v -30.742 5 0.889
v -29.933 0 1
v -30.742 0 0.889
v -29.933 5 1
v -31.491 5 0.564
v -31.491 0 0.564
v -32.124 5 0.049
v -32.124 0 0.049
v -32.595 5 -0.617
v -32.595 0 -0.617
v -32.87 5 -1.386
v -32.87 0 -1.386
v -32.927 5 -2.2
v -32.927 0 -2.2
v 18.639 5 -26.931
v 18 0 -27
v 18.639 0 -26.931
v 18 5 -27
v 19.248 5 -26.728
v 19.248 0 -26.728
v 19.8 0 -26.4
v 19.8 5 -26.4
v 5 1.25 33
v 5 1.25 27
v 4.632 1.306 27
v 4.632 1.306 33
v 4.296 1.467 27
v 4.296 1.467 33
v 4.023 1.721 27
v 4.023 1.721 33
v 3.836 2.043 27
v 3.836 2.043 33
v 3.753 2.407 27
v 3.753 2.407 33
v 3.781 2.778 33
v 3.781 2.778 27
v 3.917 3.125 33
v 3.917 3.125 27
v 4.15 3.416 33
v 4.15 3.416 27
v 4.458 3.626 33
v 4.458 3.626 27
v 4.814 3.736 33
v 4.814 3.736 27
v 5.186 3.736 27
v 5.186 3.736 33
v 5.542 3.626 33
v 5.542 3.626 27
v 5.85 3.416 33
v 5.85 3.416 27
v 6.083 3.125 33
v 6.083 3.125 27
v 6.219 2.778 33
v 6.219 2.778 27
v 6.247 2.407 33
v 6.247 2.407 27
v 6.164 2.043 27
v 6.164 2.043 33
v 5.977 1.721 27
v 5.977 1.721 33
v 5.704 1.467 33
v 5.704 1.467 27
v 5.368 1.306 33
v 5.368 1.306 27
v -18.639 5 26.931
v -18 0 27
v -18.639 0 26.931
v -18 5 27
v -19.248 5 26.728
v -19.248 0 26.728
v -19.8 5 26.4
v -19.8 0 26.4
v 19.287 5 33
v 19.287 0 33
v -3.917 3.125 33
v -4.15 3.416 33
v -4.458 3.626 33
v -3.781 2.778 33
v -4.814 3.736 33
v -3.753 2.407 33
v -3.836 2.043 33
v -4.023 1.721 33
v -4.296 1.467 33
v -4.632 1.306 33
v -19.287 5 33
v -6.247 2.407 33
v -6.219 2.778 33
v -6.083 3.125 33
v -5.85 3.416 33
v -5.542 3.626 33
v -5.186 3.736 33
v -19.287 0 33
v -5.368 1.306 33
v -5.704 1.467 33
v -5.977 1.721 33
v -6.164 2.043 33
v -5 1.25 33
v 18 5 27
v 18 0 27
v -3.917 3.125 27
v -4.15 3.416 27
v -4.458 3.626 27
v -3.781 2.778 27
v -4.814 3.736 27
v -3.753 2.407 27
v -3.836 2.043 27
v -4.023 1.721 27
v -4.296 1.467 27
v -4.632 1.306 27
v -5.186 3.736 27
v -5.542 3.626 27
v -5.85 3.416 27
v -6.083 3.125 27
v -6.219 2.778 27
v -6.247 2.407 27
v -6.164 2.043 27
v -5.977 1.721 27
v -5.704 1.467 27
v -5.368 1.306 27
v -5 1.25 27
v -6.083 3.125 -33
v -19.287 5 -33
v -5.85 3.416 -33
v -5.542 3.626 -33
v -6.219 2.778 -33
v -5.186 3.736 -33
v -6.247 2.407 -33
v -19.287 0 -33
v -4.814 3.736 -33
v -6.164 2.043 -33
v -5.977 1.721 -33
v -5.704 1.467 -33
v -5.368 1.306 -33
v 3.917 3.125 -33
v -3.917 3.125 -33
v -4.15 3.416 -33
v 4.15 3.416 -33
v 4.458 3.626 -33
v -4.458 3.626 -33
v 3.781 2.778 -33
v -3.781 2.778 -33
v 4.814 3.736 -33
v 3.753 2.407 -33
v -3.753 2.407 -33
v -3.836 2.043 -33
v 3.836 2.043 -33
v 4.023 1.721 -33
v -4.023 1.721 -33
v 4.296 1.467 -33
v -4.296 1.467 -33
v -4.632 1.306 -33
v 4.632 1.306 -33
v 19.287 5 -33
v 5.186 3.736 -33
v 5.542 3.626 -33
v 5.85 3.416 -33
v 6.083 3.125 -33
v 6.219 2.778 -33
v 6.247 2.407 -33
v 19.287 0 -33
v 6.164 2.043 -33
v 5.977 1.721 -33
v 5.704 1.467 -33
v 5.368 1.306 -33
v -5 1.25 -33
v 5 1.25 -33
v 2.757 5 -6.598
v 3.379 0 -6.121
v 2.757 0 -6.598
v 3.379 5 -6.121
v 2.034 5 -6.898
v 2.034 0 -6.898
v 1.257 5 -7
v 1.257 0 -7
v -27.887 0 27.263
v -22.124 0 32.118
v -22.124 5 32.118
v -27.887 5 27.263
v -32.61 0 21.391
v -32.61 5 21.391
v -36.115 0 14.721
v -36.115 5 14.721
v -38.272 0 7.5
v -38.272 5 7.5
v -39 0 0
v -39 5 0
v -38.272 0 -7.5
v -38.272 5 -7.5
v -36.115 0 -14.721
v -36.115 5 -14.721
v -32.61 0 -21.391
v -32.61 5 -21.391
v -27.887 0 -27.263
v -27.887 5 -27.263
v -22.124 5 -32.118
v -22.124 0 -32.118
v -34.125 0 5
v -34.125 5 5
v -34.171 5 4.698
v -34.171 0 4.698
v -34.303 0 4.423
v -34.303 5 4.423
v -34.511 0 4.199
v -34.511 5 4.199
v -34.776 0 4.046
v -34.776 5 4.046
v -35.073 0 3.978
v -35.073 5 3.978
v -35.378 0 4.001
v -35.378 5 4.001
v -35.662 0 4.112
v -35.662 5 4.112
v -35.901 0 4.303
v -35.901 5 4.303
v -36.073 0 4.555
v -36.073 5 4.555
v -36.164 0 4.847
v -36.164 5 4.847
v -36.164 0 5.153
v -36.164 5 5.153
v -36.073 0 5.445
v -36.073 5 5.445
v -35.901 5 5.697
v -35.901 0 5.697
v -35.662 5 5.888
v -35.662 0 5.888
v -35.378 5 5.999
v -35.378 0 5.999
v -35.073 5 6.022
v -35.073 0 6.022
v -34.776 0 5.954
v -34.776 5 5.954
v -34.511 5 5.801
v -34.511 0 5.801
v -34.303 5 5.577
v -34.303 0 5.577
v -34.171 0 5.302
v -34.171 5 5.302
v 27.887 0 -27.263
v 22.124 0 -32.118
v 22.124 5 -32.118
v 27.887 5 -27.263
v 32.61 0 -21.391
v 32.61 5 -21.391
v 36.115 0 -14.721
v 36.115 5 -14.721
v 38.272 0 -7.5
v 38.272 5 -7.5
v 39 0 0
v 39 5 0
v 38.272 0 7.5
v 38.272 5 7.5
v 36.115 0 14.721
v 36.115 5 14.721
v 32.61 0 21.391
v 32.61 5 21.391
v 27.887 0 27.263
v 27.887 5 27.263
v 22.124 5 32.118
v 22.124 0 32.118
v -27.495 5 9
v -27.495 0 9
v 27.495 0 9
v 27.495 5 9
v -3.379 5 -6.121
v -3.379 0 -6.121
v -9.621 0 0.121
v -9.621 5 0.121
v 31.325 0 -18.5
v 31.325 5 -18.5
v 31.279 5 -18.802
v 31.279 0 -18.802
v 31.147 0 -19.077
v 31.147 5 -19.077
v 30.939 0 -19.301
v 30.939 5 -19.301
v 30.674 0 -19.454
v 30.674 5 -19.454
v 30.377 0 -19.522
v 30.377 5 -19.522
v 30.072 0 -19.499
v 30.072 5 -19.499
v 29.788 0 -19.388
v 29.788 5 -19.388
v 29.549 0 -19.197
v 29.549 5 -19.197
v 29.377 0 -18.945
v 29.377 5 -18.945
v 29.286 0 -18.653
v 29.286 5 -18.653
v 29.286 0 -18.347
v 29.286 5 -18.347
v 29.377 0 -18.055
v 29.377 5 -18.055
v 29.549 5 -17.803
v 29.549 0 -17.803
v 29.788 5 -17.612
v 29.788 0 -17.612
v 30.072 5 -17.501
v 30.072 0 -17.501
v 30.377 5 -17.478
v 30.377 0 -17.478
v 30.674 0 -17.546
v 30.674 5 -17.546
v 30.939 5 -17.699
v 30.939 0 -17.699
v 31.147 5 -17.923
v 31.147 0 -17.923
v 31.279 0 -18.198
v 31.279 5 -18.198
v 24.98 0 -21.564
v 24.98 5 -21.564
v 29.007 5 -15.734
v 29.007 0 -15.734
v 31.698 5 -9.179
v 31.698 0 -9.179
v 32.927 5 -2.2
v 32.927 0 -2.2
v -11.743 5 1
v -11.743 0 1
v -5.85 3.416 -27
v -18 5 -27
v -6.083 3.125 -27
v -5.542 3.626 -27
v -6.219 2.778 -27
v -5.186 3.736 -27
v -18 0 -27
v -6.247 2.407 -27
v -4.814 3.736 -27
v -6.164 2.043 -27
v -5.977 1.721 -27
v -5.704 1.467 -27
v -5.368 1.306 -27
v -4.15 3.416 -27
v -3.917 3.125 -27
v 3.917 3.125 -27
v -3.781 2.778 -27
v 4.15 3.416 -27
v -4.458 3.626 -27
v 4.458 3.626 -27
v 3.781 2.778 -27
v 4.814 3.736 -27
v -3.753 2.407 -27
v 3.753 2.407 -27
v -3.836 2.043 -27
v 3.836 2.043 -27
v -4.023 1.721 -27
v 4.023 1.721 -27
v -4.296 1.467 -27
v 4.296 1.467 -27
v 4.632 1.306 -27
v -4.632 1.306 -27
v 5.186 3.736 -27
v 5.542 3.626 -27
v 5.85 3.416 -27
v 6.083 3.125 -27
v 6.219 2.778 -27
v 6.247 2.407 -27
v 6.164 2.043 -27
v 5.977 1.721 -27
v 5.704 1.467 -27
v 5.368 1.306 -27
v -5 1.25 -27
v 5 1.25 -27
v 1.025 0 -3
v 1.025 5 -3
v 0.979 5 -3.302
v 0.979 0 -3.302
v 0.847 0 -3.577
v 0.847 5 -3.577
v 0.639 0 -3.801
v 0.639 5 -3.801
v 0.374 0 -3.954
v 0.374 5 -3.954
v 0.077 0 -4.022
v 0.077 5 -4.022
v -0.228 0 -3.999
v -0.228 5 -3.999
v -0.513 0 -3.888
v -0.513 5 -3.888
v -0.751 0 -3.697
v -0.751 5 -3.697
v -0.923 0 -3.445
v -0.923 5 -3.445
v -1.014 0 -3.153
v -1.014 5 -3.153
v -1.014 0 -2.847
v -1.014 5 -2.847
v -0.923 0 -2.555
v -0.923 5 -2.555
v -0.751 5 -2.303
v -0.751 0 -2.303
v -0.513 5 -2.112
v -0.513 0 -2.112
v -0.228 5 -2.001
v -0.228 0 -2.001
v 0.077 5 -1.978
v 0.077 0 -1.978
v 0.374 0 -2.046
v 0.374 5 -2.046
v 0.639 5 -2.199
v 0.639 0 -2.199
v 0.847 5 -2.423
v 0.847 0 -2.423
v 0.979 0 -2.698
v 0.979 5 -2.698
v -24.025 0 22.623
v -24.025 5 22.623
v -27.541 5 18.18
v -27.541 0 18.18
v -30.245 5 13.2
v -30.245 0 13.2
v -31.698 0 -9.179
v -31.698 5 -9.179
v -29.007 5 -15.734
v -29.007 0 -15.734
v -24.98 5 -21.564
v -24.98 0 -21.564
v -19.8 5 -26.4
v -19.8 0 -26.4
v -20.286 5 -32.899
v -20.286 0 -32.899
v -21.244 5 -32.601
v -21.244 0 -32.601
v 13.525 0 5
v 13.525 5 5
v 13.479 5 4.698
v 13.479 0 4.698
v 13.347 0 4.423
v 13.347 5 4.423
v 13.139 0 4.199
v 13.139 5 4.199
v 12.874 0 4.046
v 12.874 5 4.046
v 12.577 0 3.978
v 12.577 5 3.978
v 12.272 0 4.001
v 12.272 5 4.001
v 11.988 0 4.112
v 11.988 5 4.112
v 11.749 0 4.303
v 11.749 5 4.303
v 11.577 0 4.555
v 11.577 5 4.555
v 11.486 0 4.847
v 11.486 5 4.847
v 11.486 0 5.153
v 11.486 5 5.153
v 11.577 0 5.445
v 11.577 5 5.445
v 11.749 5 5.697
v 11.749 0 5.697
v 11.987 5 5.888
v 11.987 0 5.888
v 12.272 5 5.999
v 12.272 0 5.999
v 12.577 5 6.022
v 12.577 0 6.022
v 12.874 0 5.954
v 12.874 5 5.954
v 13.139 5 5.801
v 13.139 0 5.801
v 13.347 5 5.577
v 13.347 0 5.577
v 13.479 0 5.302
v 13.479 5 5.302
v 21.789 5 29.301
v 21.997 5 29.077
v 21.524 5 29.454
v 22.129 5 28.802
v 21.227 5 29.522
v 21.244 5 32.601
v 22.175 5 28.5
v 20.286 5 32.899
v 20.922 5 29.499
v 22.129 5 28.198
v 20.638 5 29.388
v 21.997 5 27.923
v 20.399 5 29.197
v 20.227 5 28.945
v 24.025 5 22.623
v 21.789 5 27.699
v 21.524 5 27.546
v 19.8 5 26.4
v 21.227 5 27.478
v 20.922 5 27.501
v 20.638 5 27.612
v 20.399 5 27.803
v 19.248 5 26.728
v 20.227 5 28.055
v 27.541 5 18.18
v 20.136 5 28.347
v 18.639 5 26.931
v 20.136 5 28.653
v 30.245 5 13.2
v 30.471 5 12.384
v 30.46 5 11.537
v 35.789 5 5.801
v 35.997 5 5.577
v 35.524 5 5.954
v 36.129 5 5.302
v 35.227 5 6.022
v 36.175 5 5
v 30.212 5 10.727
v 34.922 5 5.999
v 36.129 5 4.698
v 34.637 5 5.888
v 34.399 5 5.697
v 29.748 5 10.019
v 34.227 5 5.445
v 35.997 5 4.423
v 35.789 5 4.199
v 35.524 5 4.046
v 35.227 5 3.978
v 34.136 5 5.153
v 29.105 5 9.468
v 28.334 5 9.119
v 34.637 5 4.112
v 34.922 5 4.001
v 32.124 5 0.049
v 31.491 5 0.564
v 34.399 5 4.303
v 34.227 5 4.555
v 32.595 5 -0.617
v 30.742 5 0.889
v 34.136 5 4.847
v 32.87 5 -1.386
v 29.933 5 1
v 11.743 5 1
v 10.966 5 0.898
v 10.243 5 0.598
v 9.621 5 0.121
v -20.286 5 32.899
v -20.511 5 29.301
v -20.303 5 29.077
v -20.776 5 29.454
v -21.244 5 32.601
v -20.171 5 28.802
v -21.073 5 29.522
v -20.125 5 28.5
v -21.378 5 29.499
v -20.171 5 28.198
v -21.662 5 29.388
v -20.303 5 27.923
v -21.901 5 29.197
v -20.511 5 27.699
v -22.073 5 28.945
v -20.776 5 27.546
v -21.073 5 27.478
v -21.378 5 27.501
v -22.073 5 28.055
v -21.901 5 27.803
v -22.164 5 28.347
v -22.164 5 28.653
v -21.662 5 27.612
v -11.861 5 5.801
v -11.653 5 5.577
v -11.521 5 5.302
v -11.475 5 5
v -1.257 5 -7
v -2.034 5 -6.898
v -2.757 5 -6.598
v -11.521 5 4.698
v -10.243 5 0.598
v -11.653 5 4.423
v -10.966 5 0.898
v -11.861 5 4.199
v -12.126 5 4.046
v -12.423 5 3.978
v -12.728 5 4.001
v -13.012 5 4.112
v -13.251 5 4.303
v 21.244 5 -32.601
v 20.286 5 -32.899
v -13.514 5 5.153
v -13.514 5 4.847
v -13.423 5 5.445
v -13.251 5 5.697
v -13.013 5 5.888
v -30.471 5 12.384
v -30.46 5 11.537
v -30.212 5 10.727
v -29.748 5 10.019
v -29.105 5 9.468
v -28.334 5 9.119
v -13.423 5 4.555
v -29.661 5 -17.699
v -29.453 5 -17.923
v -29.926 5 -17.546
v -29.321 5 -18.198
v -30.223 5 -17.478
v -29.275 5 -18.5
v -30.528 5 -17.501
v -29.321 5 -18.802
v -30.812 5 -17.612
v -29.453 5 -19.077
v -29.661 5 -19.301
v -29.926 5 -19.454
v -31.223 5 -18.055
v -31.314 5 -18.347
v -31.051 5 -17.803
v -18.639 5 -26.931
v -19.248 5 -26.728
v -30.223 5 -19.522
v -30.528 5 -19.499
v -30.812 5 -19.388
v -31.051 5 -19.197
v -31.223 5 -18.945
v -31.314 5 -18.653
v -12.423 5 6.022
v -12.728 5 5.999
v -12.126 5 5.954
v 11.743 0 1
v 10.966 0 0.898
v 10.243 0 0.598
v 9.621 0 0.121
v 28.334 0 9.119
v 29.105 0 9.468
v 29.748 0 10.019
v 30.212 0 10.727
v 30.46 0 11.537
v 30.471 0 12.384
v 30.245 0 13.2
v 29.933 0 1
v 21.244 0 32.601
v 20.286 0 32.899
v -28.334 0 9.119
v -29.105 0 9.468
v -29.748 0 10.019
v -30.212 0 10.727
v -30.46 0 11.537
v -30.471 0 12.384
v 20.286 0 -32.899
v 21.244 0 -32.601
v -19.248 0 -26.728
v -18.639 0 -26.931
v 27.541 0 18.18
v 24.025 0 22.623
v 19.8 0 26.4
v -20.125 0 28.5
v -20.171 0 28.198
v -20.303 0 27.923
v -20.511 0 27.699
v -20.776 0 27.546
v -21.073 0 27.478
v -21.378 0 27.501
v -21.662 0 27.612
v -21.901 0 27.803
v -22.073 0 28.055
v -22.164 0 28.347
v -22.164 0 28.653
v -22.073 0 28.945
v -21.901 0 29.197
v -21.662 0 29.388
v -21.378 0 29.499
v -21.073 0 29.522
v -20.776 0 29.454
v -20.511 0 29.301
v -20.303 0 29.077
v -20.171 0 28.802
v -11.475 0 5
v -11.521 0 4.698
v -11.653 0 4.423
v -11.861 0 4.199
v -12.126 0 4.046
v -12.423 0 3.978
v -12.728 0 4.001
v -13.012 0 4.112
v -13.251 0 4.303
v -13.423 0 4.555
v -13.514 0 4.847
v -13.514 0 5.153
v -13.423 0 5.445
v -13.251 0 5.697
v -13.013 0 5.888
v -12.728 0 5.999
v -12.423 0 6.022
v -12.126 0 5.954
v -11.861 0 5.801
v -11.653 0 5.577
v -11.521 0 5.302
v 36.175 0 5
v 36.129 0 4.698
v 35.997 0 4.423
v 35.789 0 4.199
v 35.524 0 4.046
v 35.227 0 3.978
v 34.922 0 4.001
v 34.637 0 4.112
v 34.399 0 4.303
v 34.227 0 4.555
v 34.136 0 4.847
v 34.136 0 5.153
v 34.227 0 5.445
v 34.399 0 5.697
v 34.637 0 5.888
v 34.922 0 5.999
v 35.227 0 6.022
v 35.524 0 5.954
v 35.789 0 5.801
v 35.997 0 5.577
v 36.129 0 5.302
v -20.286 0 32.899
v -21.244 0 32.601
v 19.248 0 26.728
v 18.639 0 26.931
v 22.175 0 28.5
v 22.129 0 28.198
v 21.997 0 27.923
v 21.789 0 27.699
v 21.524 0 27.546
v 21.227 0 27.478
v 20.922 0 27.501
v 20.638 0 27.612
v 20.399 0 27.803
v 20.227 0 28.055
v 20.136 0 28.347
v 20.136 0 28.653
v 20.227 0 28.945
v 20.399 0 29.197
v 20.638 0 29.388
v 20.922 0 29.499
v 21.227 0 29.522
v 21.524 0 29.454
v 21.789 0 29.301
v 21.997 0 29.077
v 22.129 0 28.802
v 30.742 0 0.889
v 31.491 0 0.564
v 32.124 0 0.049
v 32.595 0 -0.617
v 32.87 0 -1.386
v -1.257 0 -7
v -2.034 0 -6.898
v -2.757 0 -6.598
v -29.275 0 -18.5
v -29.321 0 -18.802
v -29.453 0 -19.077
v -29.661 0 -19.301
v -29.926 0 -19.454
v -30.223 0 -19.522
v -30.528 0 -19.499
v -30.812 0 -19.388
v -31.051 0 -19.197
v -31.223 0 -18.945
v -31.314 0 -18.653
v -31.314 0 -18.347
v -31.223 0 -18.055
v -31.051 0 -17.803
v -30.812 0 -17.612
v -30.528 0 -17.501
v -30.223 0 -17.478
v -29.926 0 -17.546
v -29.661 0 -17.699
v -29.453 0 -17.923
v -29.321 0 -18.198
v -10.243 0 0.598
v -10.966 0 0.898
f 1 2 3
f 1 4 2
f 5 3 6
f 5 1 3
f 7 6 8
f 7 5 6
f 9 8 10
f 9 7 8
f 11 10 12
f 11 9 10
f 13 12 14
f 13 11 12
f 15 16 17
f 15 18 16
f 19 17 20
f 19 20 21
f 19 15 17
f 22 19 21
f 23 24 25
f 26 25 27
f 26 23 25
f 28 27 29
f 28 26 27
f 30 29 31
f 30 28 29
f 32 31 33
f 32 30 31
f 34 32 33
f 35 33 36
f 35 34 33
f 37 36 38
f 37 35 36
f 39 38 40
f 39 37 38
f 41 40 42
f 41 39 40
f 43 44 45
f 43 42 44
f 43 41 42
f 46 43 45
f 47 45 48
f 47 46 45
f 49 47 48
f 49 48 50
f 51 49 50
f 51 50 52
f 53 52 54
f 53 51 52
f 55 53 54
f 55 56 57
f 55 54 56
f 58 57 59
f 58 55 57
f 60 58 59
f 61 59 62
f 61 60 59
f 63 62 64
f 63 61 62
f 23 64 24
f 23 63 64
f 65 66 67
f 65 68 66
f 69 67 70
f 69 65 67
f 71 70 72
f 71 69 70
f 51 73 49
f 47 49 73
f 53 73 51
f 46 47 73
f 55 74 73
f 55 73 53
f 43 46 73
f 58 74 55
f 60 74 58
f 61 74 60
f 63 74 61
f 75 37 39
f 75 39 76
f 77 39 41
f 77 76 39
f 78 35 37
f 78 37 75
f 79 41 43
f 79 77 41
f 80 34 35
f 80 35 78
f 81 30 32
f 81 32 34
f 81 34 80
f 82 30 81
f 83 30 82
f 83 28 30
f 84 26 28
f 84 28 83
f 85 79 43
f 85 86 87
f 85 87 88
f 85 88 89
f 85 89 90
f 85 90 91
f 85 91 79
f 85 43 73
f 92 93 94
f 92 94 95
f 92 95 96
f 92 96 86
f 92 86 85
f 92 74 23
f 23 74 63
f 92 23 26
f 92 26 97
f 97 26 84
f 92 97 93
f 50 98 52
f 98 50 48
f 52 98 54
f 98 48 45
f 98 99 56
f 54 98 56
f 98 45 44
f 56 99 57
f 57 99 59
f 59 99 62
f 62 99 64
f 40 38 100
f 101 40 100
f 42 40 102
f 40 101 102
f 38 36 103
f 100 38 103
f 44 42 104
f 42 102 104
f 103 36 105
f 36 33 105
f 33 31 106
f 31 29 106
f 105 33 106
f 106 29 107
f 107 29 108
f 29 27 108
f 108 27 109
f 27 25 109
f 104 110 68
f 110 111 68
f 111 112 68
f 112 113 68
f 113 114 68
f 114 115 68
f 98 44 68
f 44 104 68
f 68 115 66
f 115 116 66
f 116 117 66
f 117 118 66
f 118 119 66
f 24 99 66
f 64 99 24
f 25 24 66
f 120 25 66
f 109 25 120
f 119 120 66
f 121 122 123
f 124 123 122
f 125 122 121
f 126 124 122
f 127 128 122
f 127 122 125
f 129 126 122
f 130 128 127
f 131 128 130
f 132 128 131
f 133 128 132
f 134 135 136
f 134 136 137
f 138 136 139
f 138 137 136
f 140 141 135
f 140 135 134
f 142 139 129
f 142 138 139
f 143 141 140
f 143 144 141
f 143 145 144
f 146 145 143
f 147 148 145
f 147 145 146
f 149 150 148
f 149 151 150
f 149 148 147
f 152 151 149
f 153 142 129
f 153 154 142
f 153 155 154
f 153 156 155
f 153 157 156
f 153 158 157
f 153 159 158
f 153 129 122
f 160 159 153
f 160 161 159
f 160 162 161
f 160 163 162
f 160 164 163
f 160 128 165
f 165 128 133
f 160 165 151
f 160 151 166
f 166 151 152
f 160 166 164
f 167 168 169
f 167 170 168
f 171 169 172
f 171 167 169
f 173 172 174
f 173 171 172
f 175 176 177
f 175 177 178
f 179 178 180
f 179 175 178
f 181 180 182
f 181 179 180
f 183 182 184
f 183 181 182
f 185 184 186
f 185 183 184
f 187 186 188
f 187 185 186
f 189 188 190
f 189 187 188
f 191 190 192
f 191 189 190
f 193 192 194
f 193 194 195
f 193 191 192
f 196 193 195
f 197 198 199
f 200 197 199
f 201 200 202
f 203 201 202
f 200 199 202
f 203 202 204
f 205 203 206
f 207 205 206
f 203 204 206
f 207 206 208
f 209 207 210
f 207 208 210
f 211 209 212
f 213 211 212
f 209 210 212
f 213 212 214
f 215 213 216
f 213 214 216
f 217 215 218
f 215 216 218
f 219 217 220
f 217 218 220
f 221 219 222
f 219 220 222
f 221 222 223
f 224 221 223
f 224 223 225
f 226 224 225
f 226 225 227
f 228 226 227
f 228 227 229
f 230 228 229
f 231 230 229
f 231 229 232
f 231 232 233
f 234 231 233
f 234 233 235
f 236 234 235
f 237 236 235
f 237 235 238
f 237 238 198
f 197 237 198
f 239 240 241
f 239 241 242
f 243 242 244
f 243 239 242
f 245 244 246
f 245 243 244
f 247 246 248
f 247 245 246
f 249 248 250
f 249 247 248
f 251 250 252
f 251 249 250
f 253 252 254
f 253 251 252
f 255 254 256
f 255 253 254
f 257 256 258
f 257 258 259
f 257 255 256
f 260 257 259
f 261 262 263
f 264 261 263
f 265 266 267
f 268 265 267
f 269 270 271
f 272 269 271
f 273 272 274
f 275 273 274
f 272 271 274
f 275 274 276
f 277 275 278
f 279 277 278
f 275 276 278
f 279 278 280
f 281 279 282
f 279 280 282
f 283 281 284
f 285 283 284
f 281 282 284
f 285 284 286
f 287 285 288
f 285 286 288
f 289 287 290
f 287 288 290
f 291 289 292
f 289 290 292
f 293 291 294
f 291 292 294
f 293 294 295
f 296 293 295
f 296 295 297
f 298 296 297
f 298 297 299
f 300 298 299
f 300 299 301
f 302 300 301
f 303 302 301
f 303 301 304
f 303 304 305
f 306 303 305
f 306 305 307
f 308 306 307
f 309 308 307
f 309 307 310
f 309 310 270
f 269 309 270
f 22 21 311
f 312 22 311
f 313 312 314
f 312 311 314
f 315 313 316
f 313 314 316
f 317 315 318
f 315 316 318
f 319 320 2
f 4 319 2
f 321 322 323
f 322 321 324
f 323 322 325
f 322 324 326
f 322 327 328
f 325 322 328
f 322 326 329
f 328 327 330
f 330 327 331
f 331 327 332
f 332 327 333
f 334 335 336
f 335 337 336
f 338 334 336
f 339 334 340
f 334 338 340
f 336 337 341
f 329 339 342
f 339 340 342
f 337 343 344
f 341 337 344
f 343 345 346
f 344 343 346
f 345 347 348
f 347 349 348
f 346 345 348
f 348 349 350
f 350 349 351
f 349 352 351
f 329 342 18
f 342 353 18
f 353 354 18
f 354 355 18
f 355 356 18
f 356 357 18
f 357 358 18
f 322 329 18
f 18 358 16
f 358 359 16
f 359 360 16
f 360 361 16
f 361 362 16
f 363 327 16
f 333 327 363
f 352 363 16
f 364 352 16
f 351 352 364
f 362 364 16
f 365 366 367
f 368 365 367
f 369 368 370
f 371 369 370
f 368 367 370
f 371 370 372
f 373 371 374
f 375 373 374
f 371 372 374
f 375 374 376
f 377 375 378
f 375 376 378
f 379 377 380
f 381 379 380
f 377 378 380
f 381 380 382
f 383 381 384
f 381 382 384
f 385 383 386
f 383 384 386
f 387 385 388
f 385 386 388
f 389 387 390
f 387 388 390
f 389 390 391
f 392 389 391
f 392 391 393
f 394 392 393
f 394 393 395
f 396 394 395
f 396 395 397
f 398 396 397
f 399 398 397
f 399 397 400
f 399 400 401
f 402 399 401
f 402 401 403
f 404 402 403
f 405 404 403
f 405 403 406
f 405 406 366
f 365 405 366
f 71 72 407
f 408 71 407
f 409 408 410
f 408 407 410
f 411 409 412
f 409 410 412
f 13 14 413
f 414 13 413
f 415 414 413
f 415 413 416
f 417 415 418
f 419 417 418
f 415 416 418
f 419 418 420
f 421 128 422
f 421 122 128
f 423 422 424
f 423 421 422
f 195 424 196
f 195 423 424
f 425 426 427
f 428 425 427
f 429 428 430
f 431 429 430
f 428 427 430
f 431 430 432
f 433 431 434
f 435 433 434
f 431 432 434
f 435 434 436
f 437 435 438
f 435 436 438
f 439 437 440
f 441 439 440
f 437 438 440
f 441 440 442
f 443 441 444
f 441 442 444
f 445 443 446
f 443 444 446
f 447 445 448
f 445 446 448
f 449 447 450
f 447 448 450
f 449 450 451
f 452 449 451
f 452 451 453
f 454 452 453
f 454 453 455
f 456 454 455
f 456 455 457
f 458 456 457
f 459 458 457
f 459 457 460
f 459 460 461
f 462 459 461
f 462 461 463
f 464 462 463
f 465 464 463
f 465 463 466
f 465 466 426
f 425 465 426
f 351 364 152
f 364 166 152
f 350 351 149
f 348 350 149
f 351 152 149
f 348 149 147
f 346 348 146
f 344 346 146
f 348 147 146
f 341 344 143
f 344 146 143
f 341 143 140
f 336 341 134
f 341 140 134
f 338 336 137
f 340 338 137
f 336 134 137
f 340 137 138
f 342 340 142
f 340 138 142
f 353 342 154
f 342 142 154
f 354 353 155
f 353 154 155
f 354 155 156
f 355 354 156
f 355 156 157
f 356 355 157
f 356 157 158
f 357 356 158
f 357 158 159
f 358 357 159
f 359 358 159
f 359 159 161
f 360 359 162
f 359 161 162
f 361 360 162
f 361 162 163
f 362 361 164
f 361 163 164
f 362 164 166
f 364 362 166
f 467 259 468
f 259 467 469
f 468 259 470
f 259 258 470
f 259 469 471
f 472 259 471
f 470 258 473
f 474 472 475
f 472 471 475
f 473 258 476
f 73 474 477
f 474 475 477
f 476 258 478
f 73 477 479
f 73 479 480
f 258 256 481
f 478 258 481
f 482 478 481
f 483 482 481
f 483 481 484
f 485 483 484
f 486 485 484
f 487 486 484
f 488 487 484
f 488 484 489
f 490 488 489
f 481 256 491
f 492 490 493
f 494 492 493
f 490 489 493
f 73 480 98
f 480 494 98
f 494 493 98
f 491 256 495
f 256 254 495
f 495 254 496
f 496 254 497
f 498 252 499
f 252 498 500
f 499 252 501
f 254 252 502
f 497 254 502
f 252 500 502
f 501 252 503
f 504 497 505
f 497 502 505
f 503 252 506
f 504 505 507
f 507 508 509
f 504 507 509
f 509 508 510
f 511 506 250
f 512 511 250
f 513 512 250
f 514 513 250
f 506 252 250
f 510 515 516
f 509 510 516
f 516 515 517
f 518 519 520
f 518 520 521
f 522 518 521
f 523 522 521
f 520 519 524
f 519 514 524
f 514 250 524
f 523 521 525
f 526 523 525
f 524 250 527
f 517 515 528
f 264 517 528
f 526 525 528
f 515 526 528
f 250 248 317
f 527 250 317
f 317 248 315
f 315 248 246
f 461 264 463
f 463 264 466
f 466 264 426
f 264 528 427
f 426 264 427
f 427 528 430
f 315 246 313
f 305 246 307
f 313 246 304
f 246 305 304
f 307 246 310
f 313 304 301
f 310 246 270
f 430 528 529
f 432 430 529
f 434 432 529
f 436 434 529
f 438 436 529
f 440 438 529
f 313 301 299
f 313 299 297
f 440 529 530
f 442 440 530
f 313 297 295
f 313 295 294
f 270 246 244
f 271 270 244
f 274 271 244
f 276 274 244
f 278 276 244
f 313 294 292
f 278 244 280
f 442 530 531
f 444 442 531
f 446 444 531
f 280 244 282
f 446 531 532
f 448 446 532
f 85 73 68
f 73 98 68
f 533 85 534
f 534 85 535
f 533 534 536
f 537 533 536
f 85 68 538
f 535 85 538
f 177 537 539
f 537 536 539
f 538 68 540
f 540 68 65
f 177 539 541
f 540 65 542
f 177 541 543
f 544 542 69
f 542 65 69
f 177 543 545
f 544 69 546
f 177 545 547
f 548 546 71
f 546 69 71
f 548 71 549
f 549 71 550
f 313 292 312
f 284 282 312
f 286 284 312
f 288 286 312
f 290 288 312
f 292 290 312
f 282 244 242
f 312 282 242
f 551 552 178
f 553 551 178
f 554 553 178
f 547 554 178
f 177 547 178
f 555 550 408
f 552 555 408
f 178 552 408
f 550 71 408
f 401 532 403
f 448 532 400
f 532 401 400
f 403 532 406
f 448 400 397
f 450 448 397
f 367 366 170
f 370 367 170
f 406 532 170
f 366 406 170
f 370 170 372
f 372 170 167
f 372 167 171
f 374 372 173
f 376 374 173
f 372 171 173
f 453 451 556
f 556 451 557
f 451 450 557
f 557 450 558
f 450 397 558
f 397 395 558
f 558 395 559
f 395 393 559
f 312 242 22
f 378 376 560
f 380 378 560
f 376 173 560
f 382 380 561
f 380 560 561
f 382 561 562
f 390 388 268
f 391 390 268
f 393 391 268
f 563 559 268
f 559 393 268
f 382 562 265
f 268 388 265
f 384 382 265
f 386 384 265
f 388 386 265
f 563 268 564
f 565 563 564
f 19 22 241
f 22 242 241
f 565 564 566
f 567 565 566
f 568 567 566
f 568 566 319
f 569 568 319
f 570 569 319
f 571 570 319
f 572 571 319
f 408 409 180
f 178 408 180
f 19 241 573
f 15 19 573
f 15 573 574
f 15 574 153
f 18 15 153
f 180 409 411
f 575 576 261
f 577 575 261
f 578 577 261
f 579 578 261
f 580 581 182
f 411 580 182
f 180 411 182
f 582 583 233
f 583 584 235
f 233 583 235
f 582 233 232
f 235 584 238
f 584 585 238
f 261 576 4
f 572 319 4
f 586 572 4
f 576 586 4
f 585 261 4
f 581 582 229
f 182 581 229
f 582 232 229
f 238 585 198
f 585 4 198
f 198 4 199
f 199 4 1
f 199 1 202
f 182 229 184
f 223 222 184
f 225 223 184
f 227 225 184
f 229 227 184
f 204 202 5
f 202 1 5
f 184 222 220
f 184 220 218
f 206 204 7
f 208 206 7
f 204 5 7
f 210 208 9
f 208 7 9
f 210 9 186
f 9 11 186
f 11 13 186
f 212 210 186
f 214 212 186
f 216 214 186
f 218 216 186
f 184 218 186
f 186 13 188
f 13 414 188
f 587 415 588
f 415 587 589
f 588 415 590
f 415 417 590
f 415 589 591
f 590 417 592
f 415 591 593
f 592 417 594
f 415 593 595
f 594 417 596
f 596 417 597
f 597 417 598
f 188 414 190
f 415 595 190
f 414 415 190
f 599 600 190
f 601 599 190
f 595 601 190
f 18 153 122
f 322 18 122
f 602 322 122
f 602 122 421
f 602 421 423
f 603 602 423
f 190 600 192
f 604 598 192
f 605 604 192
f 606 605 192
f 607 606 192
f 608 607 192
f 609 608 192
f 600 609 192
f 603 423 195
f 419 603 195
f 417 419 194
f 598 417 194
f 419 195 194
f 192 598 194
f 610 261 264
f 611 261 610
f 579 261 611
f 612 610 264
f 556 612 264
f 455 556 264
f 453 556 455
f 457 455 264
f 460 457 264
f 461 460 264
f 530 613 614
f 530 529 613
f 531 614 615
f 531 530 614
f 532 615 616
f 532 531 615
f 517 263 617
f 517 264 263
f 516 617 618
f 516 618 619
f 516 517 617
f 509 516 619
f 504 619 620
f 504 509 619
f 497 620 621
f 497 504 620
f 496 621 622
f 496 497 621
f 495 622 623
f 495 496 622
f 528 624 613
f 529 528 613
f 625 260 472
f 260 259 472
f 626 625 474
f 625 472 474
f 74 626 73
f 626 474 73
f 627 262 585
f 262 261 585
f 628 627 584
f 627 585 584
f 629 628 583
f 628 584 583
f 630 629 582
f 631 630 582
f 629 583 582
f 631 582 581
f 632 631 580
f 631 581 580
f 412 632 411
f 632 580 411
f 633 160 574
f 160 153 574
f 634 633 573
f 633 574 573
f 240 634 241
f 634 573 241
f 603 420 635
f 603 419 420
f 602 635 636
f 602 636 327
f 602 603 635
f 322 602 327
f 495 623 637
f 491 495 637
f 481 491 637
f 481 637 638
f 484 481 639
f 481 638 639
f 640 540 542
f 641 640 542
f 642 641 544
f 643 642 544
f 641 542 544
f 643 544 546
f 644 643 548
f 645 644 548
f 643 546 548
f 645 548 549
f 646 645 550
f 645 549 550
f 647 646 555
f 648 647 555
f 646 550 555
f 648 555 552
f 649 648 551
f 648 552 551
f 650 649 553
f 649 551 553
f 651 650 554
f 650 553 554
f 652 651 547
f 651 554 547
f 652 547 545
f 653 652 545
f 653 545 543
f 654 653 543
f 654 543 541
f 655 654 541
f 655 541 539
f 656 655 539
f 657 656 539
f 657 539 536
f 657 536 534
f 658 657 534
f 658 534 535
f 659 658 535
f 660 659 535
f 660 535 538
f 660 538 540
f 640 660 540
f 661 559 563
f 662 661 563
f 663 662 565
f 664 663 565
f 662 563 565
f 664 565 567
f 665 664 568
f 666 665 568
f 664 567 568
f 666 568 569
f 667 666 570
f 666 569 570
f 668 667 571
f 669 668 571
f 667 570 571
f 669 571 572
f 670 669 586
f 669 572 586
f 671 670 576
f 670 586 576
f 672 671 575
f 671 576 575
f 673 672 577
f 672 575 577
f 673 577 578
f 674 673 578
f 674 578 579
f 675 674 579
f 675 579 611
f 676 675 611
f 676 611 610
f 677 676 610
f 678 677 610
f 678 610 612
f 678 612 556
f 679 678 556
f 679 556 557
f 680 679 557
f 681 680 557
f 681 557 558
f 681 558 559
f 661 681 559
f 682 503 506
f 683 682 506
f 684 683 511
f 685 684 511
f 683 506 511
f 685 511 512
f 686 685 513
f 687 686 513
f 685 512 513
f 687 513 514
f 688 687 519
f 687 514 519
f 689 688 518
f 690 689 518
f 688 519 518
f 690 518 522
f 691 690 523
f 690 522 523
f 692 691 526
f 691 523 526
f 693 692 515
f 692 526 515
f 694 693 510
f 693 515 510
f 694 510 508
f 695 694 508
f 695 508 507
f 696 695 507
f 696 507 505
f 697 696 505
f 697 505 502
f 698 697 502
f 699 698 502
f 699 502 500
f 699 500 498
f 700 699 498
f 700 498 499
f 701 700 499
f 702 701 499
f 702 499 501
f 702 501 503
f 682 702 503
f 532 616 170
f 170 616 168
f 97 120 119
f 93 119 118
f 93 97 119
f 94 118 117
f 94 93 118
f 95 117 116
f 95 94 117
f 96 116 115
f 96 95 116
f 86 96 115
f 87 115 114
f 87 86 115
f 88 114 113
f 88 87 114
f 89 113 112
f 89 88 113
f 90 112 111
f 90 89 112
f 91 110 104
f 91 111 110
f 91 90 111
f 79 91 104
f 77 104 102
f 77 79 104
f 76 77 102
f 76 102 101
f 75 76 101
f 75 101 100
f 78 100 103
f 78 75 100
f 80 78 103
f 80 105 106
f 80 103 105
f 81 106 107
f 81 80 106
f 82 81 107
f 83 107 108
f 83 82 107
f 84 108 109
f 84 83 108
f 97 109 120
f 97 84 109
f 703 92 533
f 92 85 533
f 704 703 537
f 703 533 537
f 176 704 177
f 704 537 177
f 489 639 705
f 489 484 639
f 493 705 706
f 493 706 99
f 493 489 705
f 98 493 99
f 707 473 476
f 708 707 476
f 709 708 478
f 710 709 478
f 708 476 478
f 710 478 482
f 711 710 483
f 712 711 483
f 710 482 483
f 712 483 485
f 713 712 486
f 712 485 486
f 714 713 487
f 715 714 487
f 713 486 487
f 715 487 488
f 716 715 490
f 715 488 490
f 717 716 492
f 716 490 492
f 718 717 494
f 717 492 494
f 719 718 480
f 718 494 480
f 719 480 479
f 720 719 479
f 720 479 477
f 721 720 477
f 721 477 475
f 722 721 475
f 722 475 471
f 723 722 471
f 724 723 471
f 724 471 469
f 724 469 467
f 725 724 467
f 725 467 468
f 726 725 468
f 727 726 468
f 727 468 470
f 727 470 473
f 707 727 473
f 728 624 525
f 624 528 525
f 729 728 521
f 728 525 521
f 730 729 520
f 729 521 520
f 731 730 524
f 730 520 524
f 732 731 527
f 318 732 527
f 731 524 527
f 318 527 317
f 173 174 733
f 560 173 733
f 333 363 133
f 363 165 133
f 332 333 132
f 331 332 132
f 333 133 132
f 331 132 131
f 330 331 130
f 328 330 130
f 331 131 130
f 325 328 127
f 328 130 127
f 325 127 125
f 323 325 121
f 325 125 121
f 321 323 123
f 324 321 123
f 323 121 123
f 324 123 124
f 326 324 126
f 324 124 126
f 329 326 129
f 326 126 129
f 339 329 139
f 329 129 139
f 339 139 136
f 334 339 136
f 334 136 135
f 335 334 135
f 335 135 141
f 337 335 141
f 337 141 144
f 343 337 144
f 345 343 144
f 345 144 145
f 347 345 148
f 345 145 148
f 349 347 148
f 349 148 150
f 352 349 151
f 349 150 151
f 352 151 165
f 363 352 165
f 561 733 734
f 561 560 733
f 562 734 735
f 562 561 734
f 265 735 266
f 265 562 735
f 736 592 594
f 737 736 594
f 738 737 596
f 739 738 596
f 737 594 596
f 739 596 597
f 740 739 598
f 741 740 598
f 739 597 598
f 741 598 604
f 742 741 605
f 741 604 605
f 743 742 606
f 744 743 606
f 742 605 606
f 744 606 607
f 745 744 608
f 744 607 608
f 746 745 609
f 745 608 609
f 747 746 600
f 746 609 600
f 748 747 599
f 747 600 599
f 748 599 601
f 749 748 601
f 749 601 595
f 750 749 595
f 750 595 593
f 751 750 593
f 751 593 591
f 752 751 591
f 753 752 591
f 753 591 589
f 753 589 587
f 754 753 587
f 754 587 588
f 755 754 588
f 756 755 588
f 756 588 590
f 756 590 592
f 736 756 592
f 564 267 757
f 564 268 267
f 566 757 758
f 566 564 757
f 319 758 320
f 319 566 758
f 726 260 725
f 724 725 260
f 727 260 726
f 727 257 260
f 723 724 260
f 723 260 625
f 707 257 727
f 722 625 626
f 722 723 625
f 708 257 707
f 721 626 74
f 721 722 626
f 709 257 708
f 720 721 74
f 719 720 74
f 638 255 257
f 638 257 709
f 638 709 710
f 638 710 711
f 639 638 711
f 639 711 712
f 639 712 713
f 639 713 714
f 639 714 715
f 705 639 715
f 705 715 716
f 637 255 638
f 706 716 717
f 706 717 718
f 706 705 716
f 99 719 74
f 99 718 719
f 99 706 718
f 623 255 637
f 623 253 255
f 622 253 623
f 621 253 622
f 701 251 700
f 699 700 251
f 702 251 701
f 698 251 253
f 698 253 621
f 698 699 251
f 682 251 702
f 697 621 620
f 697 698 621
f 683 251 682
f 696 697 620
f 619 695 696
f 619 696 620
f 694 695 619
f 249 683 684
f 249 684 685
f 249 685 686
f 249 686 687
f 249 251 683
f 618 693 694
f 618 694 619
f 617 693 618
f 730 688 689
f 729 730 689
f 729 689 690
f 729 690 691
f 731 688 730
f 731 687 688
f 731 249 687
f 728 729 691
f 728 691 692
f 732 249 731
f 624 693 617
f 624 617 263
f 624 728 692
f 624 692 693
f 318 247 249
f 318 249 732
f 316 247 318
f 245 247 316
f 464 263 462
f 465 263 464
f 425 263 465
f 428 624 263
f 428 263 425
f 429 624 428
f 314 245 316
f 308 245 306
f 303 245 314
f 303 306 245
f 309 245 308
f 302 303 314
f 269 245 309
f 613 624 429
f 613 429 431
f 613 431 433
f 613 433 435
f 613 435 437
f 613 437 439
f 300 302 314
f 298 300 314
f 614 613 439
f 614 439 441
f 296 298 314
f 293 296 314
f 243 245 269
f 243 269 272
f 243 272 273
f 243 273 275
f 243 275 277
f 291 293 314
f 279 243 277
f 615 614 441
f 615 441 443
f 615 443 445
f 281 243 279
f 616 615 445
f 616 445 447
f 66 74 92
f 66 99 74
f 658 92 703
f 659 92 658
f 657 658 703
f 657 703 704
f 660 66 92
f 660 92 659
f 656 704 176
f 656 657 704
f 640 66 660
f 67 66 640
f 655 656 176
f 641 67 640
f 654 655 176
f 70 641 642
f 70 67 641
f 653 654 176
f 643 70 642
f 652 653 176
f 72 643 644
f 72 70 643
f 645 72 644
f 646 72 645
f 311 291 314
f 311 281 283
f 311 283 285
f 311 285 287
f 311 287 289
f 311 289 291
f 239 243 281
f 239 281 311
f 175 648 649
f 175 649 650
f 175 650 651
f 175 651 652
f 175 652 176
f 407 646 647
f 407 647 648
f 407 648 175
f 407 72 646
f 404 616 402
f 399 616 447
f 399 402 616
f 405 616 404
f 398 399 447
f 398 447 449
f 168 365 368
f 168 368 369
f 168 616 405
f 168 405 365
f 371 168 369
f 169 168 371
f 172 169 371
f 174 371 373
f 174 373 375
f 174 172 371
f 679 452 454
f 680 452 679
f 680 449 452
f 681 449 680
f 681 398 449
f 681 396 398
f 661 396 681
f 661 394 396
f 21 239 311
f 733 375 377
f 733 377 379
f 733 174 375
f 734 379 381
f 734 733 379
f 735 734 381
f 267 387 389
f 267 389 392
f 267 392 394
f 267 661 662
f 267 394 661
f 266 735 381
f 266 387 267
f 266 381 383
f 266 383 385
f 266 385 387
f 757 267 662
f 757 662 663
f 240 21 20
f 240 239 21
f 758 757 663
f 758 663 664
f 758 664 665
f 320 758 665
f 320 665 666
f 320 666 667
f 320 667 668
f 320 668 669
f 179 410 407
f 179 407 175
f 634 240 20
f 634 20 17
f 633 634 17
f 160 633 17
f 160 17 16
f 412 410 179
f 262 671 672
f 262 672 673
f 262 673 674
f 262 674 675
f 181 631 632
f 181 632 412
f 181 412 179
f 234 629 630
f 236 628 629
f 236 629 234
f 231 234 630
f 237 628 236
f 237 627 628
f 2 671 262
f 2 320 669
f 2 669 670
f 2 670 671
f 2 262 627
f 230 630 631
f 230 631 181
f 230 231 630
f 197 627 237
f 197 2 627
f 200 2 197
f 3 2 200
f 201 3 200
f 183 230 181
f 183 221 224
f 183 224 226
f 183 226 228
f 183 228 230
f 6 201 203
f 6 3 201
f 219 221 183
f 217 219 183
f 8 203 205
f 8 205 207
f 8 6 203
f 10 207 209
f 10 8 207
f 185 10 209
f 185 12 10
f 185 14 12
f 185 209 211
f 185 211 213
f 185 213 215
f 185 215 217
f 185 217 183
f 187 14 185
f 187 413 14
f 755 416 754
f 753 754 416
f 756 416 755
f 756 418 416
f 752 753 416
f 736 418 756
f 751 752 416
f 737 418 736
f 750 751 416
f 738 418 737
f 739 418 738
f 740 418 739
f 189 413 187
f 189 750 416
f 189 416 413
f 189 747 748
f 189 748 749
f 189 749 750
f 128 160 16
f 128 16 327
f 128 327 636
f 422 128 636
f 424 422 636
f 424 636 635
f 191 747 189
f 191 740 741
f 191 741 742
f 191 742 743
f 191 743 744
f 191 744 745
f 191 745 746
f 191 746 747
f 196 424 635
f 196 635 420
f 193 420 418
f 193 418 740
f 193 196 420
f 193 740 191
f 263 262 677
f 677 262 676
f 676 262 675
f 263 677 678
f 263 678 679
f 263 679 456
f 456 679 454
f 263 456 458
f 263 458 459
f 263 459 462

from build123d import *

# Parameters (mm, degrees)
BOSS_EXTRUDE1_DEPTH            = 5
FILLET1_R                      = 5
M3X0_5_TAPPED_HOLE1_AT_2_COUNT = 2
M3X0_5_TAPPED_HOLE1_AT_2_PITCH = 10
M2_5X0_45_TAPPED_HOLE2_D       = 2.05
CUT_EXTRUDE1_DEPTH             = 5
FILLET2_R                      = 3
M2_5X0_45_TAPPED_HOLE1_D       = 2.05


with BuildPart() as part:
    # Sketch1 → Boss-Extrude1 (new body)
    with BuildSketch(Plane(origin=(0, 0, 0), x_dir=(1, 0, 0), z_dir=(0, 1, 0))):
        with BuildLine():
            Line((-20.784609691, 33), (20.784609691, 33))
            ThreePointArc((20.784609691, 33), (39, 0), (20.784609691, -33))
            Line((20.784609691, -33), (-20.784609691, -33))
            ThreePointArc((-20.784609691, -33), (-39, 0), (-20.784609691, 33))
        make_face()
    extrude(amount=BOSS_EXTRUDE1_DEPTH)

    # Fillet1
    fillet1_edges = [part.edges().sort_by_distance(p)[0] for p in [
        (-20.784609691, 2.5, -33),
        (20.784609691, 2.5, -33),
        (20.784609691, 2.5, 33),
        (-20.784609691, 2.5, 33),
    ]]
    fillet(fillet1_edges, radius=FILLET1_R)

    # Sketch3 → M3x0.5 Tapped Hole1 (revolve, cut)
    with BuildSketch(Plane(origin=(-5, 2.5, 33), x_dir=(0, -1, 0), z_dir=(1, 0, 0))):
        Polygon((0, 0), (0, 8.251075774), (1.25, 7.5), (1.25, 0), align=None)
    m3x0_5_tapped_hole1 = revolve(axis=Axis((-5, 2.5, 39.35), (0, 0, -1)), mode=Mode.SUBTRACT)

    # M3x0.5 Tapped Hole1 at 2: M3x0.5 Tapped Hole1 ×2
    with Locations(*[(i * M3X0_5_TAPPED_HOLE1_AT_2_PITCH, 0, 0) for i in range(1, M3X0_5_TAPPED_HOLE1_AT_2_COUNT)]):
        add(m3x0_5_tapped_hole1, mode=Mode.SUBTRACT)

    # Mirror1: M3x0.5 Tapped Hole1 across plane
    add(m3x0_5_tapped_hole1.mirror(Plane.XY), mode=Mode.SUBTRACT)

    # Mirror1 copy 1 sketch → Mirror1 copy 1 (revolve, cut)
    with BuildSketch(Plane(origin=(5, 2.5, -33), x_dir=(0, -1, 0), z_dir=(1, 0, 0))):
        Polygon((0, 0), (0, -8.251075774), (1.25, -7.5), (1.25, 0), align=None)
    revolve(axis=Axis((5, 2.5, -39.35), (0, 0, -1)), mode=Mode.SUBTRACT)

    # M2.5x0.45 Tapped Hole2 (through all)
    with Locations(Plane(origin=(0, 0, 0), x_dir=(-1, 0, 0), z_dir=(0, -1, 0))):
        with Locations((12.5, -5), (-12.5, -5), (0, 3)):
            Hole(M2_5X0_45_TAPPED_HOLE2_D / 2)

    # Sketch6 → Cut-Extrude1 (cut)
    with BuildSketch(Plane.XZ):
        with BuildLine():
            Line((-31.749015733, 9), (31.749015733, 9))
            ThreePointArc((31.749015733, 9), (26.910919894, 19.099800796), (18.973665961, 27))
            Line((18.973665961, 27), (-18.973665961, 27))
            ThreePointArc((-18.973665961, 27), (-26.910919894, 19.099800796), (-31.749015733, 9))
        make_face()
        with BuildLine():
            Line((32.984845005, 1), (10.5, 1))
            Line((10.5, 1), (2.5, -7))
            Line((2.5, -7), (-2.5, -7))
            Line((-2.5, -7), (-10.5, 1))
            Line((-10.5, 1), (-32.984845005, 1))
            ThreePointArc((-32.984845005, 1), (-29.511382812, -14.767473872), (-18.973665961, -27))
            Line((-18.973665961, -27), (18.973665961, -27))
            ThreePointArc((18.973665961, -27), (29.511382812, -14.767473872), (32.984845005, 1))
        make_face()
    extrude(amount=-CUT_EXTRUDE1_DEPTH, mode=Mode.SUBTRACT)

    # Fillet2
    fillet2_edges = [part.edges().sort_by_distance(p)[0] for p in [
        (10.5, 2.5, 1),
        (2.5, 2.5, -7),
        (-2.5, 2.5, -7),
        (-10.5, 2.5, 1),
        (-32.984845005, 2.5, 1),
        (-18.973665961, 2.5, -27),
        (32.984845005, 2.5, 1),
        (-18.973665961, 2.5, 27),
        (31.749015733, 2.5, 9),
        (18.973665961, 2.5, 27),
        (-31.749015733, 2.5, 9),
        (18.973665961, 2.5, -27),
    ]]
    fillet(fillet2_edges, radius=FILLET2_R)

    # M2.5x0.45 Tapped Hole1 (through all)
    with Locations(Plane(origin=(0, 0, 0), x_dir=(-1, 0, 0), z_dir=(0, -1, 0))):
        with Locations((-21.15, -28.5), (21.15, -28.5), (30.3, 18.5), (-30.3, 18.5), (-35.15, -5), (35.15, -5)):
            Hole(M2_5X0_45_TAPPED_HOLE1_D / 2)


solid = part.part
